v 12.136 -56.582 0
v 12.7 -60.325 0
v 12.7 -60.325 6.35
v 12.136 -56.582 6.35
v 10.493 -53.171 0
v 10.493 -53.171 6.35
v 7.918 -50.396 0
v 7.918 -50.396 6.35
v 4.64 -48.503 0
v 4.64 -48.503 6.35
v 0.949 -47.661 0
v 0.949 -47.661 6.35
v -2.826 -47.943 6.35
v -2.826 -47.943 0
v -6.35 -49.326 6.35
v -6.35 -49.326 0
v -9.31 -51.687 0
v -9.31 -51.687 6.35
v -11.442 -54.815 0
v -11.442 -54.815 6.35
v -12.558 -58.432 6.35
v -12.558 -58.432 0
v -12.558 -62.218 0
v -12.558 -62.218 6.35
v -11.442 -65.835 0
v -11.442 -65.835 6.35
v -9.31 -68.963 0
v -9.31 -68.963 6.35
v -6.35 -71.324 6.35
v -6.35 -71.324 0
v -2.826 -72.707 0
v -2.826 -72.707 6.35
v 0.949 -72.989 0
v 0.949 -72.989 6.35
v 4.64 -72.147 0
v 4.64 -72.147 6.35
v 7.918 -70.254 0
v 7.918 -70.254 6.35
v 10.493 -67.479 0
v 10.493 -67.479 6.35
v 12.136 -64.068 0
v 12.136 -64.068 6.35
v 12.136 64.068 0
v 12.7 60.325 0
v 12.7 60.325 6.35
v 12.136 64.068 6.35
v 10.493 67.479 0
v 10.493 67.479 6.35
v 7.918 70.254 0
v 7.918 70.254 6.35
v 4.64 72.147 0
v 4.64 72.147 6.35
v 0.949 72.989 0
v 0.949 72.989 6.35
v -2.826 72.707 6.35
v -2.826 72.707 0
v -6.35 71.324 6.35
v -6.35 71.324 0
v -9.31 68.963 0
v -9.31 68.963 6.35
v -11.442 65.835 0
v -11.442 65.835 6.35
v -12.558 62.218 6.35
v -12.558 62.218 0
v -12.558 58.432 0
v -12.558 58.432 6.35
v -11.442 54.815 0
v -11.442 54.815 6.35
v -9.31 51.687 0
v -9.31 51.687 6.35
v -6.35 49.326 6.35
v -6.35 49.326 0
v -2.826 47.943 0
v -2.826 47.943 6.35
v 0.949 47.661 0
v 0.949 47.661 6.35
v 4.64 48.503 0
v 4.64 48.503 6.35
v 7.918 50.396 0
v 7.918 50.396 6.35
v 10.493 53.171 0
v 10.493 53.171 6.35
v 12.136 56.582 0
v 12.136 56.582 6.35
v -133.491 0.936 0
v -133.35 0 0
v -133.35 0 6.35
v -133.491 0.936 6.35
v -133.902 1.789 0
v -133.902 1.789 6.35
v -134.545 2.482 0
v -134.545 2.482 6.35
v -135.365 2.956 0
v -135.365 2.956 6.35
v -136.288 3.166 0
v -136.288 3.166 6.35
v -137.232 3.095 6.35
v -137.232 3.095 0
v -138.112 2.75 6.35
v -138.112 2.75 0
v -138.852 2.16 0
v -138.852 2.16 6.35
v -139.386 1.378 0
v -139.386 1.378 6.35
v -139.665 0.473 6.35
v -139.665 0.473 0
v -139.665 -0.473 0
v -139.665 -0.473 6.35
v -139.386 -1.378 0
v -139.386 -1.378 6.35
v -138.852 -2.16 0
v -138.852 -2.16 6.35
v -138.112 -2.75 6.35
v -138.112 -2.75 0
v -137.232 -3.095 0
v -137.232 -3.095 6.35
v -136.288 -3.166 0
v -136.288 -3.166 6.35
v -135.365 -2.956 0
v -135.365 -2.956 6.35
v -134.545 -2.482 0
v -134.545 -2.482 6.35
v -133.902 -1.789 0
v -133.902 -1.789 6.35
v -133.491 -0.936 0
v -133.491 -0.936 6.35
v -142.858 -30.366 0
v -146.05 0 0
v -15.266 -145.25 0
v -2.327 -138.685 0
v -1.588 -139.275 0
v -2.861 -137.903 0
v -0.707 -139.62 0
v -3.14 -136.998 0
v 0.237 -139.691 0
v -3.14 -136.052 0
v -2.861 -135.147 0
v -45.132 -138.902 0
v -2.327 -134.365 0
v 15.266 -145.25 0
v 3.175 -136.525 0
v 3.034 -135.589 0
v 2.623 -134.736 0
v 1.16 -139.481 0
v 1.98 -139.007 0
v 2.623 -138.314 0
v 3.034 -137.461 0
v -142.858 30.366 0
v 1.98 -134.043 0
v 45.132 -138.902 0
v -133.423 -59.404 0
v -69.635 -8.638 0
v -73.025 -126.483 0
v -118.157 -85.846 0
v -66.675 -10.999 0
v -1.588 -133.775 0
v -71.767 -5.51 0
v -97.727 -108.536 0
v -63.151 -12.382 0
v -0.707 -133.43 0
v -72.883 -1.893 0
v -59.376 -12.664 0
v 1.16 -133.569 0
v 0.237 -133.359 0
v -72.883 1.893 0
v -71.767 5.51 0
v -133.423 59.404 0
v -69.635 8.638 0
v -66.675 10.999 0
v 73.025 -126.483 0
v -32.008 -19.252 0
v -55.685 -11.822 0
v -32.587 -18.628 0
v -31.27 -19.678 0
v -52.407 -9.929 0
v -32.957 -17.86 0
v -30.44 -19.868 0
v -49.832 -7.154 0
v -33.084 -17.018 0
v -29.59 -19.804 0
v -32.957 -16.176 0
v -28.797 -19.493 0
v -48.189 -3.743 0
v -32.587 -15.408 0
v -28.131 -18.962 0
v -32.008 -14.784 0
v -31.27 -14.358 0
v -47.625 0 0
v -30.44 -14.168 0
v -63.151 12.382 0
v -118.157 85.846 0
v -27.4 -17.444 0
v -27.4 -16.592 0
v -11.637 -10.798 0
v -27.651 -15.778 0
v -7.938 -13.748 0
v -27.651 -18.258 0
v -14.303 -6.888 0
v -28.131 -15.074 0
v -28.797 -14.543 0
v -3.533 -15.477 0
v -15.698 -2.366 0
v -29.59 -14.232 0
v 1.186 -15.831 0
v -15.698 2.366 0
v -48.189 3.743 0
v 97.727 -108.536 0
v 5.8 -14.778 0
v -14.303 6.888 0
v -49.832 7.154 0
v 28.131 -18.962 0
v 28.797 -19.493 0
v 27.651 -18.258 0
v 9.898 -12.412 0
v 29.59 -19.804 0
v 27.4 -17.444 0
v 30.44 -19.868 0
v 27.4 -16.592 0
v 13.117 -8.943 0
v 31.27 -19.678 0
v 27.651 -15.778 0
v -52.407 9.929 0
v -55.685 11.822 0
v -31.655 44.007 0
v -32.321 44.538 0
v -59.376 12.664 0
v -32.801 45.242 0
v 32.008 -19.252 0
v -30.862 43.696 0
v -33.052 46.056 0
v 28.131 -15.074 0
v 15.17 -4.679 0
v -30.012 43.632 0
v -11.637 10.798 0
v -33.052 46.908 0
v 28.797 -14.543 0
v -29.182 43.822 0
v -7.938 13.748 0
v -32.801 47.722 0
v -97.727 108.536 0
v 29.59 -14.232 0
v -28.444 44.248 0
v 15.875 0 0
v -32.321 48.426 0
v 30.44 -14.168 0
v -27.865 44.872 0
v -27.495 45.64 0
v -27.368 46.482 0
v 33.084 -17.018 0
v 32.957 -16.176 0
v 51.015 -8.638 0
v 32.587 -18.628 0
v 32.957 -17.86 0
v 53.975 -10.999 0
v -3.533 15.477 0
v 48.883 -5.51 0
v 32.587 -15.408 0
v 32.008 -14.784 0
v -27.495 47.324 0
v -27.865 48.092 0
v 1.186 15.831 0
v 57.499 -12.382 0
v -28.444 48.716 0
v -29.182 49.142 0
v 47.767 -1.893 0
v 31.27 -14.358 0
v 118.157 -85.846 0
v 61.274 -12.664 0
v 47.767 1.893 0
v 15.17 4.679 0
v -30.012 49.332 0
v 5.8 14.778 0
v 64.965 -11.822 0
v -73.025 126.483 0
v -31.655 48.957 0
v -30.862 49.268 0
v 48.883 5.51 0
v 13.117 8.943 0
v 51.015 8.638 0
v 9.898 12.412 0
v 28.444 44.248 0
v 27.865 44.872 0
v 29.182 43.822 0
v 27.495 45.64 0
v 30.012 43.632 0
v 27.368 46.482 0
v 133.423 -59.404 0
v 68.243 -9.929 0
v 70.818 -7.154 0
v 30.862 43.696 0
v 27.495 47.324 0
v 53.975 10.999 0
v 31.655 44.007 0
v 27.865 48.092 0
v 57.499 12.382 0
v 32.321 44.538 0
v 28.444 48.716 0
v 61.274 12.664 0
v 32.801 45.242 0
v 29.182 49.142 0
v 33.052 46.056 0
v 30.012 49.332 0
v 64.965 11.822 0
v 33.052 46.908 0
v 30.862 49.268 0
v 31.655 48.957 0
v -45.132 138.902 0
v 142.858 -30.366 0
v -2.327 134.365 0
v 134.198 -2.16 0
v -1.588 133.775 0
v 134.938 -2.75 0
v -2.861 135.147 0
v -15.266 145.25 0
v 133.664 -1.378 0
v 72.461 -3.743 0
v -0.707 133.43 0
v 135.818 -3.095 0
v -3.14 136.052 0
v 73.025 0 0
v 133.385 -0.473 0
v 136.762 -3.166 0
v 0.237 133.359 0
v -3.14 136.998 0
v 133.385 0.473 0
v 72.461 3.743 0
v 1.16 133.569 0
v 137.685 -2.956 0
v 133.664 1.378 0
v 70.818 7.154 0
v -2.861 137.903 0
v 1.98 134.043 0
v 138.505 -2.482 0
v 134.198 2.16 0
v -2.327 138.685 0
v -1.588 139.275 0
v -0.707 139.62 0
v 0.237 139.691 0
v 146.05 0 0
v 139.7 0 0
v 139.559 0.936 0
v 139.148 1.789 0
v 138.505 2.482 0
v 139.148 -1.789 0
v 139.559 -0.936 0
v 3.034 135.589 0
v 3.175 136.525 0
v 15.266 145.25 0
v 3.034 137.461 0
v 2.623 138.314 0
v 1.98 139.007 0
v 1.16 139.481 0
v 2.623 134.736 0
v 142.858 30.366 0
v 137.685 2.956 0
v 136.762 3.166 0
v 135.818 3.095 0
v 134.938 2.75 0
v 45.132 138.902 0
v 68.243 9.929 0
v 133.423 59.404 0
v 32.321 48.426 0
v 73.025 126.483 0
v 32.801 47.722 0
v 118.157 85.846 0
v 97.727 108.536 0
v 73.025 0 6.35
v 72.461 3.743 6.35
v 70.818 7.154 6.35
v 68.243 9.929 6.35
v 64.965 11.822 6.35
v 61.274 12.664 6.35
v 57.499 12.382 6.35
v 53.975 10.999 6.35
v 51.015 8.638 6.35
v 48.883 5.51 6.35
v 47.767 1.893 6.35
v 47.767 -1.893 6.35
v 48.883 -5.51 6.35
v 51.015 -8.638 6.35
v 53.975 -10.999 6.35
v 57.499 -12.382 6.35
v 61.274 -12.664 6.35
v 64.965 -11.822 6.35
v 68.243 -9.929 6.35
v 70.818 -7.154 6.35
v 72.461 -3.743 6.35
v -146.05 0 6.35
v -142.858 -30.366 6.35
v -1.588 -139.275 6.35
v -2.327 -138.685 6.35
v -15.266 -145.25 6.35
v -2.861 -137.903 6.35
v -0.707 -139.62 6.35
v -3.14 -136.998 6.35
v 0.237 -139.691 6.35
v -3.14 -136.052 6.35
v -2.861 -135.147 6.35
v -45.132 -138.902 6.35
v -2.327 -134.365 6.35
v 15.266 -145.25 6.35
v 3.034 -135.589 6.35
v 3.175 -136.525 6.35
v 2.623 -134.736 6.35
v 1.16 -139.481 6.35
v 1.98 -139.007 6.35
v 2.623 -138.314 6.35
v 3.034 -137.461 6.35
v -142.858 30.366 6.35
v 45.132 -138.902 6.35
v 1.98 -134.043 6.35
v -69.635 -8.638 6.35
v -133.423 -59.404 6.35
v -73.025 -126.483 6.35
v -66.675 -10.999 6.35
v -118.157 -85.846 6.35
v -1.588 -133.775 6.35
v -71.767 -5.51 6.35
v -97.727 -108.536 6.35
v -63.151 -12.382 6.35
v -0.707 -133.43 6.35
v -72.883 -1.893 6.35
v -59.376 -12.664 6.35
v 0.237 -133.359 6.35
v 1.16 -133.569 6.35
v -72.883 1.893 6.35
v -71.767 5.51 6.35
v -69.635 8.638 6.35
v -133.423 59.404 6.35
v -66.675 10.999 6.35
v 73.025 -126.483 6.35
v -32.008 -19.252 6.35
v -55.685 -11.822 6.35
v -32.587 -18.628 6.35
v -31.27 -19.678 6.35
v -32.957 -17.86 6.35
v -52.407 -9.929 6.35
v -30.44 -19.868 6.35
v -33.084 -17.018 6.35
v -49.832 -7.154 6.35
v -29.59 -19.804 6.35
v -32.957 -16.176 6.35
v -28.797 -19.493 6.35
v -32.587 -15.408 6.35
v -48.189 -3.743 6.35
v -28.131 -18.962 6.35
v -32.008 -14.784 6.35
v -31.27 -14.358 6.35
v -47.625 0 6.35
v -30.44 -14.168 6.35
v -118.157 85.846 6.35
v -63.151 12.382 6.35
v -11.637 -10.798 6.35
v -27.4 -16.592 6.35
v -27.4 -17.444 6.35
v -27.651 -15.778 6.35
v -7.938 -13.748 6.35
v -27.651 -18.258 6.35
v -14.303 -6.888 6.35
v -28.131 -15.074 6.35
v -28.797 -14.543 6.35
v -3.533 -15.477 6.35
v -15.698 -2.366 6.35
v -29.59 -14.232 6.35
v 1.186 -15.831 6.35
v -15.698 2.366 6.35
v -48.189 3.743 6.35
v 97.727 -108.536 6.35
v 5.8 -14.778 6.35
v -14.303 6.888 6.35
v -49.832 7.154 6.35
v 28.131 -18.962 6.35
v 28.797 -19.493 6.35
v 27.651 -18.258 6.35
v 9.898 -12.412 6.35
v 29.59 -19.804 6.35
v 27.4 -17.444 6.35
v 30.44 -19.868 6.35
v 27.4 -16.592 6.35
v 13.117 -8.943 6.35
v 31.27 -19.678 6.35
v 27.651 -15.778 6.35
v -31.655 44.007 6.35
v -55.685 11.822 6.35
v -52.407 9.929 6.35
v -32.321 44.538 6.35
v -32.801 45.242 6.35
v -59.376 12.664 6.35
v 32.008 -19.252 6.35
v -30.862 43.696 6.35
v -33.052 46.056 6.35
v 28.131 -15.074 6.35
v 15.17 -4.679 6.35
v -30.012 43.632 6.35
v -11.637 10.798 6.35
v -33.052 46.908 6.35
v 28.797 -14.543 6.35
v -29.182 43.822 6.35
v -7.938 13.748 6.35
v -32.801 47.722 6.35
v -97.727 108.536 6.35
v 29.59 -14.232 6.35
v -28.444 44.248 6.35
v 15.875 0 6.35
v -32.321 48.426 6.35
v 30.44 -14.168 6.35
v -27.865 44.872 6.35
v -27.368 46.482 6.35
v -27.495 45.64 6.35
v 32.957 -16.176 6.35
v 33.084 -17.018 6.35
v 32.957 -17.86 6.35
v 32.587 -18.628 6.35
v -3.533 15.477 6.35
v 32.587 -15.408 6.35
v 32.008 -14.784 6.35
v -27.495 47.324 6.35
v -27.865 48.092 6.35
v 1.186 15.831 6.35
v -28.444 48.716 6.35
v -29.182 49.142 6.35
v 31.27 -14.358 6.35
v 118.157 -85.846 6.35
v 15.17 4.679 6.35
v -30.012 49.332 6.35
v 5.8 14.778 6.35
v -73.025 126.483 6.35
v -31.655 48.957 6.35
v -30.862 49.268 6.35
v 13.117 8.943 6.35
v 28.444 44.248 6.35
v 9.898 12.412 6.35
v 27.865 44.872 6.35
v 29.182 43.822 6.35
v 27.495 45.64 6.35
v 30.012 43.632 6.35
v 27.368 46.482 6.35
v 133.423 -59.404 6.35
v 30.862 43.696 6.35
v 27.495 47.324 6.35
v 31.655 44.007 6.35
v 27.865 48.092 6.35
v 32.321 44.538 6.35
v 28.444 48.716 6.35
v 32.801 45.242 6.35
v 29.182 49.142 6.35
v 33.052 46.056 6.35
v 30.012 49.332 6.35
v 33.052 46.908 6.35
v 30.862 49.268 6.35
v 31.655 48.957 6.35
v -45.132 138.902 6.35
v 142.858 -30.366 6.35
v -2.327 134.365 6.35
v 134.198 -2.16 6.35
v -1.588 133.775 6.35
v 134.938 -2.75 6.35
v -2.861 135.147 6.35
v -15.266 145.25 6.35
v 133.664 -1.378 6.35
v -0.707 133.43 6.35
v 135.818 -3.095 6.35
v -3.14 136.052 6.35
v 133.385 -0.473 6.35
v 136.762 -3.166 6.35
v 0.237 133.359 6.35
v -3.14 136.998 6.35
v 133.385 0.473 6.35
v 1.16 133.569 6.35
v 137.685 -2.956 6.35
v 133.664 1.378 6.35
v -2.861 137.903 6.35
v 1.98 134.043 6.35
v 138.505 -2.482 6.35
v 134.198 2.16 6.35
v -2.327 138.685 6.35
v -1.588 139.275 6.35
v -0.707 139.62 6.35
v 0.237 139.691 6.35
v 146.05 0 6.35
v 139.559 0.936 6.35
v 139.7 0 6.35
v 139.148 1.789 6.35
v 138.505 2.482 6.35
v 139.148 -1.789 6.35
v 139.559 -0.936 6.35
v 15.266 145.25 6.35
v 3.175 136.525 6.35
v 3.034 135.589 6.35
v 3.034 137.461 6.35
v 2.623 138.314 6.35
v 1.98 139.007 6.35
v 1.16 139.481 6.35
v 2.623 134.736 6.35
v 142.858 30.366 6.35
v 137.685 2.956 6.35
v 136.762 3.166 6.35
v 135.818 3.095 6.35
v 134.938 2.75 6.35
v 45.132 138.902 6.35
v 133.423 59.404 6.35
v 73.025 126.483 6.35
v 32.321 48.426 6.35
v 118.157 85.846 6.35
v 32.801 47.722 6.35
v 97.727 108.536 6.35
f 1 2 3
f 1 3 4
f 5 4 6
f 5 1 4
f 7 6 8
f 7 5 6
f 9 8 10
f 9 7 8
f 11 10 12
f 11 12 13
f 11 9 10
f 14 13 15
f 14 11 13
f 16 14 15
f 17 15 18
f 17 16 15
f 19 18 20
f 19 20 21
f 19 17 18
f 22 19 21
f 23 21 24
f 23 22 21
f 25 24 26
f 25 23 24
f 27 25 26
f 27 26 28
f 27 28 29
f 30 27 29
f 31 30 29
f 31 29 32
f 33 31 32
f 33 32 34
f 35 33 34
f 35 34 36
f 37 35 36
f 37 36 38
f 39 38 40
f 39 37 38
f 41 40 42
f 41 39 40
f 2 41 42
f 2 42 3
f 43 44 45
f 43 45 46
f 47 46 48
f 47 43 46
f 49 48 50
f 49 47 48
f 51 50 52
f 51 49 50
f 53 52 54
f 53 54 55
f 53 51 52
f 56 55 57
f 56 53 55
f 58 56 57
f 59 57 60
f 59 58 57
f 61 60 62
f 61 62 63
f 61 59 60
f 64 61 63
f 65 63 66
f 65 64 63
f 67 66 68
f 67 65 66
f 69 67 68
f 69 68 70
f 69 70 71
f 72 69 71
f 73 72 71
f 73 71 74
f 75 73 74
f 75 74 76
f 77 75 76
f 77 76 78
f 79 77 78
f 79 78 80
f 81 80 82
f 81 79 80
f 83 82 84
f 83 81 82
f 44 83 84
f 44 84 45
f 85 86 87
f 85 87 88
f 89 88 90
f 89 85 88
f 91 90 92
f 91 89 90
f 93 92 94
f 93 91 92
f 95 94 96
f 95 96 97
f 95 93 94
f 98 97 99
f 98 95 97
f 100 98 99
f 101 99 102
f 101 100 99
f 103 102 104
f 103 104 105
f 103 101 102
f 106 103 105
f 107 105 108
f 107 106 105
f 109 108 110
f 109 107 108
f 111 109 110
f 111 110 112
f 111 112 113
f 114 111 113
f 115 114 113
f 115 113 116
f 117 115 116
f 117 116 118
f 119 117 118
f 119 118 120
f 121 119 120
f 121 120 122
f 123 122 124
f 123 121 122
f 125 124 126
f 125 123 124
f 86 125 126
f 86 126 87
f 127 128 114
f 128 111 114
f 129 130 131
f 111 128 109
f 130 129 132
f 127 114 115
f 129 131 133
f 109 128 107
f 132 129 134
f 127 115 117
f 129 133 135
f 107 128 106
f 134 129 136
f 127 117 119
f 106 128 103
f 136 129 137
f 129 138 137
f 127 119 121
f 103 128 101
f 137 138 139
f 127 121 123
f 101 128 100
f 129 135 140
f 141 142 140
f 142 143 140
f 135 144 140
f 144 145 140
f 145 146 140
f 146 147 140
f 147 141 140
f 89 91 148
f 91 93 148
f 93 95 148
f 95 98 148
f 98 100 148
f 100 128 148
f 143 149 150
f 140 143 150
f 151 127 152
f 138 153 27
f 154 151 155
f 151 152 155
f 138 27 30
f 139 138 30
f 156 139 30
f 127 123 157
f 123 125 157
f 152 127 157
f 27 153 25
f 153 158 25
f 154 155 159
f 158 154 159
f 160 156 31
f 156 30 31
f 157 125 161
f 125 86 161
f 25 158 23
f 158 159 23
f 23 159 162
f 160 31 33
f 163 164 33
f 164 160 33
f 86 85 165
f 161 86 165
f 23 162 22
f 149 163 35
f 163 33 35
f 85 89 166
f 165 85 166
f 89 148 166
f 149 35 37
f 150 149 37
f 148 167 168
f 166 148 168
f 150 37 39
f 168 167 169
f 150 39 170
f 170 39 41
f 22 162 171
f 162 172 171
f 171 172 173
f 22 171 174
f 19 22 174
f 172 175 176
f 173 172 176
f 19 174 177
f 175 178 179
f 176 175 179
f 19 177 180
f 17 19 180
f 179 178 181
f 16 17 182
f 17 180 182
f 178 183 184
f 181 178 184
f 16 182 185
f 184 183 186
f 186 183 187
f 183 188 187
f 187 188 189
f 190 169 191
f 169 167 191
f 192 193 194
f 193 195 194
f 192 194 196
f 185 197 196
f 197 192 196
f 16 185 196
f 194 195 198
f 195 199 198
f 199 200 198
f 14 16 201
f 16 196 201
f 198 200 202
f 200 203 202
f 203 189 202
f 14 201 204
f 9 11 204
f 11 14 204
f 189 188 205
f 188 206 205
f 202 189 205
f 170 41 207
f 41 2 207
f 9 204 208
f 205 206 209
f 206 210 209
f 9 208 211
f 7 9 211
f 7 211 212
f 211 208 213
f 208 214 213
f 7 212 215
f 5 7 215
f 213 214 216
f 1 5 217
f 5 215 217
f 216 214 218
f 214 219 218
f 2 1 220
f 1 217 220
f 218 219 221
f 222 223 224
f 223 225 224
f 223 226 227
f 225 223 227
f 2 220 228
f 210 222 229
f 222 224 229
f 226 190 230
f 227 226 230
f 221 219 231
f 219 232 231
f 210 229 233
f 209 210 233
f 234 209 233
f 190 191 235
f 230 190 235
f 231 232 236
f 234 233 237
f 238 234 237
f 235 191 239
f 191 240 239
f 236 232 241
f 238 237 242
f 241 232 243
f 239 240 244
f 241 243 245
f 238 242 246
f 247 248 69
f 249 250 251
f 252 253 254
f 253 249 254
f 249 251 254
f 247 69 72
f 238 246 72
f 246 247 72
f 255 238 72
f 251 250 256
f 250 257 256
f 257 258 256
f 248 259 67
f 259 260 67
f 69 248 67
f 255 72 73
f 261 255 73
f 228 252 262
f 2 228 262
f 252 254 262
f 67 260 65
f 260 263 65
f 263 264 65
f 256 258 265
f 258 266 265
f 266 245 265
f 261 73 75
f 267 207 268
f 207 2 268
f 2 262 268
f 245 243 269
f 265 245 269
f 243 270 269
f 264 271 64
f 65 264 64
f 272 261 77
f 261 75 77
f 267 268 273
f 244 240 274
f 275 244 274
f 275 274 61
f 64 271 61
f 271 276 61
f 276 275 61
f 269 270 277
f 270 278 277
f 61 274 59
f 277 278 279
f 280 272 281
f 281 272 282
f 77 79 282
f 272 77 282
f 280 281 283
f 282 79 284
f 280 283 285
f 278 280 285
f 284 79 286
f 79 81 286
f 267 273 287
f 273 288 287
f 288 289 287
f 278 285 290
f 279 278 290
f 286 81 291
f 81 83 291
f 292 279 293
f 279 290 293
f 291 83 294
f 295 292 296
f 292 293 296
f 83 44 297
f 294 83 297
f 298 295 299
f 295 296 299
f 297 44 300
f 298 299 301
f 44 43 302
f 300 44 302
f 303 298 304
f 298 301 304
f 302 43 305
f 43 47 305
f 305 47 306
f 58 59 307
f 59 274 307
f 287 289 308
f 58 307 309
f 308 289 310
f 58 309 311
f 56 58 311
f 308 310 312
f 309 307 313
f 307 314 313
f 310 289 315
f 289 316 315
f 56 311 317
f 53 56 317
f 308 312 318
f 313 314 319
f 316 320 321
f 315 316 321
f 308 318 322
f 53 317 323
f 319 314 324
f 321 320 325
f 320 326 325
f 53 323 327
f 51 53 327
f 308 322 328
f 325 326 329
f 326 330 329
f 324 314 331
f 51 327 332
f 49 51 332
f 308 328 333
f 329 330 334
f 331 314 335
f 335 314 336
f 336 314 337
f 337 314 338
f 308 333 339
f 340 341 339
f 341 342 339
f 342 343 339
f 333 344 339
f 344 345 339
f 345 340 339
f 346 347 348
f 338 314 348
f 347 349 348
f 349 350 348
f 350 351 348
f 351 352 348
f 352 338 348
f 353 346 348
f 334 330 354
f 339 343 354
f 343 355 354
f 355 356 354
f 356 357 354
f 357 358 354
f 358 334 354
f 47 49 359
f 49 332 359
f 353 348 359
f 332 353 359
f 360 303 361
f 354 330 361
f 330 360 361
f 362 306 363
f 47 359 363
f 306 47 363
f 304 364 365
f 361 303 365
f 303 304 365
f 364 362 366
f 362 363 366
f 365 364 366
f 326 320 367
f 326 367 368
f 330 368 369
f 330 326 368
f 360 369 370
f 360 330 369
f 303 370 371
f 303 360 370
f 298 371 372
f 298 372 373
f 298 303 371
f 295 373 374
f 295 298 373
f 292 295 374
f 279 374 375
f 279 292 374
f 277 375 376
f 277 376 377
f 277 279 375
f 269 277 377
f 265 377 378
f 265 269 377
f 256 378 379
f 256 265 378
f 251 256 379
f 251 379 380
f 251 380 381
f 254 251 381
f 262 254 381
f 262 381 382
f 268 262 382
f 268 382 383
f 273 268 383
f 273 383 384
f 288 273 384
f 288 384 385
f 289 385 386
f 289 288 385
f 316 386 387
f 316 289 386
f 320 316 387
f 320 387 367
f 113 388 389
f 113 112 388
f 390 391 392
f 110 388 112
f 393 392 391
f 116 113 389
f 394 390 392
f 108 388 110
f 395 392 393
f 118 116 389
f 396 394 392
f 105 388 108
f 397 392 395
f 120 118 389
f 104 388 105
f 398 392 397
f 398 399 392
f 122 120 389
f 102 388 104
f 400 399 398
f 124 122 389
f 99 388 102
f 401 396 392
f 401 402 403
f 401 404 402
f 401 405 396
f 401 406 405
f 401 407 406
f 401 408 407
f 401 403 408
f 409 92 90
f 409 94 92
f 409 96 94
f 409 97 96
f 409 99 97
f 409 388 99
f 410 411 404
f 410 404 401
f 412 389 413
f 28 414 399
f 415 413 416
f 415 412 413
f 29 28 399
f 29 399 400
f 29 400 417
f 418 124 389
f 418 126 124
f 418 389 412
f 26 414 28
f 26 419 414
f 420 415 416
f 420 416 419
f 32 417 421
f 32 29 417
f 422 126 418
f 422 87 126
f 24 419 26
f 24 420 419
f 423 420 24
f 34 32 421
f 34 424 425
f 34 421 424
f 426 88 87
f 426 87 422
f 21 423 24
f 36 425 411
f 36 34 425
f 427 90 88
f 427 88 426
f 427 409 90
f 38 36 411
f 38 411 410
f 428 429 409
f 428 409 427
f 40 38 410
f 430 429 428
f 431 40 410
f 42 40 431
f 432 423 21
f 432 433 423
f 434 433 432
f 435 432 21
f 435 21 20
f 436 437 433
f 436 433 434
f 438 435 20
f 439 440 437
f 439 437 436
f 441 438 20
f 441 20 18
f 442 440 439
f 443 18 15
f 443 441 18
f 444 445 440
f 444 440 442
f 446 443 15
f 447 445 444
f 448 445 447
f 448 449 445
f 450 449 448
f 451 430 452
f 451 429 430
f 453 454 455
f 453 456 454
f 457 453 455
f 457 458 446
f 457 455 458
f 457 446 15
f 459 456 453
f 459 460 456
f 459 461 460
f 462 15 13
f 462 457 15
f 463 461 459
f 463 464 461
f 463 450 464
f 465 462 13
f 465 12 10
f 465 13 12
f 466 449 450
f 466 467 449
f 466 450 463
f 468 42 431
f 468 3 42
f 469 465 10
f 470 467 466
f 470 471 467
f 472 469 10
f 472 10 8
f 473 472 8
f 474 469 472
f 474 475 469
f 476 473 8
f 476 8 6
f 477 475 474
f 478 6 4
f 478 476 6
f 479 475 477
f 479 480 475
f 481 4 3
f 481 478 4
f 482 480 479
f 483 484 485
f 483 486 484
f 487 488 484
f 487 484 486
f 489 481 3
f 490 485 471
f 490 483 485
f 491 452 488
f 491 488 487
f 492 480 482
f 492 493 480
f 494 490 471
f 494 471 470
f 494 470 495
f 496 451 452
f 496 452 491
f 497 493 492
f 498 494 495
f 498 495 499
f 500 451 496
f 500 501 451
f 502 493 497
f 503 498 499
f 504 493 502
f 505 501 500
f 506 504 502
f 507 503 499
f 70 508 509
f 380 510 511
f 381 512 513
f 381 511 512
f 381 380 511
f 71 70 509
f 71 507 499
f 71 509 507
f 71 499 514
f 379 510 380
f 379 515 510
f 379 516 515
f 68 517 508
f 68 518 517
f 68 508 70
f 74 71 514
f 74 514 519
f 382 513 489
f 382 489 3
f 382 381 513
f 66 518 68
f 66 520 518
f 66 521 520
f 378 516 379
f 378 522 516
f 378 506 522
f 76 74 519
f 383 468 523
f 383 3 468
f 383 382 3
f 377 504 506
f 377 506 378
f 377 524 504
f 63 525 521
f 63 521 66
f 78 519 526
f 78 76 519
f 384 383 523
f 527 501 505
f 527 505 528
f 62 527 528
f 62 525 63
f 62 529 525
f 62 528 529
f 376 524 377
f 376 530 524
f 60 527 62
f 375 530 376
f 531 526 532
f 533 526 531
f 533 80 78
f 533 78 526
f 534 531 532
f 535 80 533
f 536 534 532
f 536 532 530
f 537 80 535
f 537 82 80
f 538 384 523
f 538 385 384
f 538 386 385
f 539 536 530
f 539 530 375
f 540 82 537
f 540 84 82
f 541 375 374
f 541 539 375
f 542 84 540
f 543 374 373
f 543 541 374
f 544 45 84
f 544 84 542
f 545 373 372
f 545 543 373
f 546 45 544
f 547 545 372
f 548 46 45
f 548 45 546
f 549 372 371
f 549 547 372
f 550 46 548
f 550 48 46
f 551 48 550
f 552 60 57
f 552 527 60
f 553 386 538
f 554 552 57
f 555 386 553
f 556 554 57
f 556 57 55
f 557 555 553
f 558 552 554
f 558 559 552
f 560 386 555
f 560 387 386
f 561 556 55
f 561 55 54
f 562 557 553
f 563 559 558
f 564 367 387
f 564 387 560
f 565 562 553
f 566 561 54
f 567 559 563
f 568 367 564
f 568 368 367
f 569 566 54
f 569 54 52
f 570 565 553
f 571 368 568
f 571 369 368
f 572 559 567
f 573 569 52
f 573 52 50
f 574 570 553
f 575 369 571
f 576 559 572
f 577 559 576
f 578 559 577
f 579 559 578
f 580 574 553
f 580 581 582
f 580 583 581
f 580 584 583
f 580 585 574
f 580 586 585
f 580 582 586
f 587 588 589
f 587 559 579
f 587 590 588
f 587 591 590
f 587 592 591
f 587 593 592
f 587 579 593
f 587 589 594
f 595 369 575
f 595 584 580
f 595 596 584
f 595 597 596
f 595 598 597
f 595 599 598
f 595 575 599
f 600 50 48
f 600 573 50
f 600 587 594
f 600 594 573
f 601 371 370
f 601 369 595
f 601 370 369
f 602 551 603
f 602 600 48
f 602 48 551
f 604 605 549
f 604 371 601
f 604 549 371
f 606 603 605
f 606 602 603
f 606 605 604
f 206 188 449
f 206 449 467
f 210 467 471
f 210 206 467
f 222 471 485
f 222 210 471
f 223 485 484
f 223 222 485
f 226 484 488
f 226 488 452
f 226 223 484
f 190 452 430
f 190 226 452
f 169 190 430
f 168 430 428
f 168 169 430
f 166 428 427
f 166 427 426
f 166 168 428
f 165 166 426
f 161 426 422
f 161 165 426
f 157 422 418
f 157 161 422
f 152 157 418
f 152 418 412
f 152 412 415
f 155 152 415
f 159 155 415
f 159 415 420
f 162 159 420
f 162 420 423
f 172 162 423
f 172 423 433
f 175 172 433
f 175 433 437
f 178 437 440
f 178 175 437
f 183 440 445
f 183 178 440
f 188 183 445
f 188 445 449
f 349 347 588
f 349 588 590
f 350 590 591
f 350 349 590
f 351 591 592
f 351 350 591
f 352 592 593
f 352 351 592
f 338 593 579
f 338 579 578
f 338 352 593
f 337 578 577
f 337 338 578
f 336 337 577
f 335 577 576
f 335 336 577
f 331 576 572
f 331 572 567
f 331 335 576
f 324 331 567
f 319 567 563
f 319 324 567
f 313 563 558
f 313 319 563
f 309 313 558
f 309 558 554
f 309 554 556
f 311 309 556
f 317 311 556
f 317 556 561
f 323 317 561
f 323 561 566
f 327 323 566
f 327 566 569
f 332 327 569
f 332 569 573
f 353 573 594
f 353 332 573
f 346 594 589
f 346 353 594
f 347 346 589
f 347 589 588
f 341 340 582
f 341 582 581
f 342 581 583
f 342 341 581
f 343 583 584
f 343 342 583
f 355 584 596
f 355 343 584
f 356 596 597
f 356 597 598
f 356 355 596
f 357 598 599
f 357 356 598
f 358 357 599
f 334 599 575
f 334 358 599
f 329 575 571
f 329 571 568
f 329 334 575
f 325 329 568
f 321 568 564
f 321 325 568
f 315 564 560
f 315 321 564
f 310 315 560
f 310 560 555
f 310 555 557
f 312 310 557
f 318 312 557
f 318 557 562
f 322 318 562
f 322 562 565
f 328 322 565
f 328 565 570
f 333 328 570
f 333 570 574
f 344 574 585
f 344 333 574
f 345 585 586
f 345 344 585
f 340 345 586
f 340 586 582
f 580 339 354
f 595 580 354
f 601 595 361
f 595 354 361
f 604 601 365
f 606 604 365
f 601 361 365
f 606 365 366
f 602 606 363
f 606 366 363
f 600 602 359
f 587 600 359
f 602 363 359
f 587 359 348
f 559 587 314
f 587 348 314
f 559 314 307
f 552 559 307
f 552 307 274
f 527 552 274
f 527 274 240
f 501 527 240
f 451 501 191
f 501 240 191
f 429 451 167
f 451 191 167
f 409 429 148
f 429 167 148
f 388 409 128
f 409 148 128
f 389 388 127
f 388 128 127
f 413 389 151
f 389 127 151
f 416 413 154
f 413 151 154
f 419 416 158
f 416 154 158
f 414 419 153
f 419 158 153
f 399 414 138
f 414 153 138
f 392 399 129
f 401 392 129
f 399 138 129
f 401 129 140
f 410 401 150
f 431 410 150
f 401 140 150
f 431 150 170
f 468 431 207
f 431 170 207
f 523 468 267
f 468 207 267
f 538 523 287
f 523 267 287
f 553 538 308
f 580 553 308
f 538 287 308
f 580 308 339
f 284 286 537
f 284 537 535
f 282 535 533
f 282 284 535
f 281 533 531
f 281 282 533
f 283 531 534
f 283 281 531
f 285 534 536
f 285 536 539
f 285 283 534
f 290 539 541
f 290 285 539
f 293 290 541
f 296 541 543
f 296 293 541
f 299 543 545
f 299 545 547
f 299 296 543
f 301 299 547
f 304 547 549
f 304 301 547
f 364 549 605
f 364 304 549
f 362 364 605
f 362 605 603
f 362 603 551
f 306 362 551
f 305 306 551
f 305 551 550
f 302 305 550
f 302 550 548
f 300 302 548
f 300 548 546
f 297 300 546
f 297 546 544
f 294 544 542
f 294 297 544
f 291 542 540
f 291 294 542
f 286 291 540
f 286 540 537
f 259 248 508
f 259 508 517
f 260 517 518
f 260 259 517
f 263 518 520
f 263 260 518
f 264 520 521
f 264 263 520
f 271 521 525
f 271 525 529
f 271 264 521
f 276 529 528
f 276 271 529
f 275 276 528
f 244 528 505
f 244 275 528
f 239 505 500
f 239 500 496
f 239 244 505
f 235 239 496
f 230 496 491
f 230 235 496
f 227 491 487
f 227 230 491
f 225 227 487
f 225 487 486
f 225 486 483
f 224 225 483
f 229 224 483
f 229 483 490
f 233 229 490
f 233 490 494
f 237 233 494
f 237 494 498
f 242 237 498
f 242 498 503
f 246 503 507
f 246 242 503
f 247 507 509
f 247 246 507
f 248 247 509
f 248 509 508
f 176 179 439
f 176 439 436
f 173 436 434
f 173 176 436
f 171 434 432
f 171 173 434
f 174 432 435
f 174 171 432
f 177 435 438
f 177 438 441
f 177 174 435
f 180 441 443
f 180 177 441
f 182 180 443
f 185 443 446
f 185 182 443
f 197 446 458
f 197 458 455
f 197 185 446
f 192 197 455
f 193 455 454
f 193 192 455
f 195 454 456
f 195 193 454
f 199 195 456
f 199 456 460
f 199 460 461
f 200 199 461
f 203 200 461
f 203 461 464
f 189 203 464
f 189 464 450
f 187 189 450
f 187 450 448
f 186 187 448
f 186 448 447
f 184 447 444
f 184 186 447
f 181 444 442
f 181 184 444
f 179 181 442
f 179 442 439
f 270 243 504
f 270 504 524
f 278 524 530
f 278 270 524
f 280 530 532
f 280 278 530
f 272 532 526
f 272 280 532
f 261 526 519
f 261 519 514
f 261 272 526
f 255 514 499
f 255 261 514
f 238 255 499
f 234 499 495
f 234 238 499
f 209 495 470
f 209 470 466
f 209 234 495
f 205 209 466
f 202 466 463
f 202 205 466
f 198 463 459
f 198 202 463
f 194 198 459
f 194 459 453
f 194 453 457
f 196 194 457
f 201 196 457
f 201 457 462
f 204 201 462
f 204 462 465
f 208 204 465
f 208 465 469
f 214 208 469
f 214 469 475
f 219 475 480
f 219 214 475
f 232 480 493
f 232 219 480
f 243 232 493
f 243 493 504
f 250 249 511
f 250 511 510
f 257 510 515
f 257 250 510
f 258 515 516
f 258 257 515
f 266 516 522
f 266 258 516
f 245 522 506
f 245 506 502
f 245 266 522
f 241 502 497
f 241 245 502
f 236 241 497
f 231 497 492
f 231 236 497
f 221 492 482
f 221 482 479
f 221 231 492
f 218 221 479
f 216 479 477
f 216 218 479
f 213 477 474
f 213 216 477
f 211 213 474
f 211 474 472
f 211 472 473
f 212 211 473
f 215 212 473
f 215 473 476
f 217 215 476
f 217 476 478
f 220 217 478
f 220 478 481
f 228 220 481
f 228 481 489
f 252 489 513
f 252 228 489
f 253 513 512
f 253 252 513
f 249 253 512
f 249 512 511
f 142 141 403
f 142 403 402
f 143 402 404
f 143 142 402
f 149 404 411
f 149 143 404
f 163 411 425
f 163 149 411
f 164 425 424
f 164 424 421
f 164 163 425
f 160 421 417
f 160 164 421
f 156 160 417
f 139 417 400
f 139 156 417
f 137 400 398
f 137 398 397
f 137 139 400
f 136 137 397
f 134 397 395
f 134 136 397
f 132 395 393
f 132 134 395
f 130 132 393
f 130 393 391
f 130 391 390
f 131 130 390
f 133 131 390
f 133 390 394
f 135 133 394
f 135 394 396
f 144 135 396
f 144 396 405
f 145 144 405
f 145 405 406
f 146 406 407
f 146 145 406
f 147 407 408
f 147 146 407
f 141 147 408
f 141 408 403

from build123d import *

# Parameters (mm, degrees)
SKETCH1_R           = 146.05
SKETCH1_R_2         = 3.175
SKETCH1_R_3         = 2.8575
SKETCH1_R_4         = 15.875
SKETCH1_R_5         = 12.7
BOSS_EXTRUDE1_DEPTH = 6.35


with BuildPart() as part:
    # Sketch1 → Boss-Extrude1 (new body)
    with BuildSketch(Plane.XY):
        Circle(SKETCH1_R)
        with Locations((0, 136.525)):
            Circle(SKETCH1_R_2, mode=Mode.SUBTRACT)
        with Locations((136.525, 0)):
            Circle(SKETCH1_R_2, mode=Mode.SUBTRACT)
        with Locations((0, -136.525)):
            Circle(SKETCH1_R_2, mode=Mode.SUBTRACT)
        with Locations((-136.525, 0)):
            Circle(SKETCH1_R_2, mode=Mode.SUBTRACT)
        with Locations((-30.226, 46.482)):
            Circle(SKETCH1_R_3, mode=Mode.SUBTRACT)
        with Locations(Location((30.226, 46.482, 0), (0, 0, 180))):
            Circle(SKETCH1_R_3, mode=Mode.SUBTRACT)
        with Locations((30.226, -17.018)):
            Circle(SKETCH1_R_3, mode=Mode.SUBTRACT)
        with Locations(Location((-30.226, -17.018, 0), (0, 0, 180))):
            Circle(SKETCH1_R_3, mode=Mode.SUBTRACT)
        Circle(SKETCH1_R_4, mode=Mode.SUBTRACT)
        with Locations((0, 60.325)):
            Circle(SKETCH1_R_5, mode=Mode.SUBTRACT)
        with Locations((60.325, 0)):
            Circle(SKETCH1_R_5, mode=Mode.SUBTRACT)
        with Locations((0, -60.325)):
            Circle(SKETCH1_R_5, mode=Mode.SUBTRACT)
        with Locations((-60.325, 0)):
            Circle(SKETCH1_R_5, mode=Mode.SUBTRACT)
    extrude(amount=BOSS_EXTRUDE1_DEPTH)


solid = part.part
